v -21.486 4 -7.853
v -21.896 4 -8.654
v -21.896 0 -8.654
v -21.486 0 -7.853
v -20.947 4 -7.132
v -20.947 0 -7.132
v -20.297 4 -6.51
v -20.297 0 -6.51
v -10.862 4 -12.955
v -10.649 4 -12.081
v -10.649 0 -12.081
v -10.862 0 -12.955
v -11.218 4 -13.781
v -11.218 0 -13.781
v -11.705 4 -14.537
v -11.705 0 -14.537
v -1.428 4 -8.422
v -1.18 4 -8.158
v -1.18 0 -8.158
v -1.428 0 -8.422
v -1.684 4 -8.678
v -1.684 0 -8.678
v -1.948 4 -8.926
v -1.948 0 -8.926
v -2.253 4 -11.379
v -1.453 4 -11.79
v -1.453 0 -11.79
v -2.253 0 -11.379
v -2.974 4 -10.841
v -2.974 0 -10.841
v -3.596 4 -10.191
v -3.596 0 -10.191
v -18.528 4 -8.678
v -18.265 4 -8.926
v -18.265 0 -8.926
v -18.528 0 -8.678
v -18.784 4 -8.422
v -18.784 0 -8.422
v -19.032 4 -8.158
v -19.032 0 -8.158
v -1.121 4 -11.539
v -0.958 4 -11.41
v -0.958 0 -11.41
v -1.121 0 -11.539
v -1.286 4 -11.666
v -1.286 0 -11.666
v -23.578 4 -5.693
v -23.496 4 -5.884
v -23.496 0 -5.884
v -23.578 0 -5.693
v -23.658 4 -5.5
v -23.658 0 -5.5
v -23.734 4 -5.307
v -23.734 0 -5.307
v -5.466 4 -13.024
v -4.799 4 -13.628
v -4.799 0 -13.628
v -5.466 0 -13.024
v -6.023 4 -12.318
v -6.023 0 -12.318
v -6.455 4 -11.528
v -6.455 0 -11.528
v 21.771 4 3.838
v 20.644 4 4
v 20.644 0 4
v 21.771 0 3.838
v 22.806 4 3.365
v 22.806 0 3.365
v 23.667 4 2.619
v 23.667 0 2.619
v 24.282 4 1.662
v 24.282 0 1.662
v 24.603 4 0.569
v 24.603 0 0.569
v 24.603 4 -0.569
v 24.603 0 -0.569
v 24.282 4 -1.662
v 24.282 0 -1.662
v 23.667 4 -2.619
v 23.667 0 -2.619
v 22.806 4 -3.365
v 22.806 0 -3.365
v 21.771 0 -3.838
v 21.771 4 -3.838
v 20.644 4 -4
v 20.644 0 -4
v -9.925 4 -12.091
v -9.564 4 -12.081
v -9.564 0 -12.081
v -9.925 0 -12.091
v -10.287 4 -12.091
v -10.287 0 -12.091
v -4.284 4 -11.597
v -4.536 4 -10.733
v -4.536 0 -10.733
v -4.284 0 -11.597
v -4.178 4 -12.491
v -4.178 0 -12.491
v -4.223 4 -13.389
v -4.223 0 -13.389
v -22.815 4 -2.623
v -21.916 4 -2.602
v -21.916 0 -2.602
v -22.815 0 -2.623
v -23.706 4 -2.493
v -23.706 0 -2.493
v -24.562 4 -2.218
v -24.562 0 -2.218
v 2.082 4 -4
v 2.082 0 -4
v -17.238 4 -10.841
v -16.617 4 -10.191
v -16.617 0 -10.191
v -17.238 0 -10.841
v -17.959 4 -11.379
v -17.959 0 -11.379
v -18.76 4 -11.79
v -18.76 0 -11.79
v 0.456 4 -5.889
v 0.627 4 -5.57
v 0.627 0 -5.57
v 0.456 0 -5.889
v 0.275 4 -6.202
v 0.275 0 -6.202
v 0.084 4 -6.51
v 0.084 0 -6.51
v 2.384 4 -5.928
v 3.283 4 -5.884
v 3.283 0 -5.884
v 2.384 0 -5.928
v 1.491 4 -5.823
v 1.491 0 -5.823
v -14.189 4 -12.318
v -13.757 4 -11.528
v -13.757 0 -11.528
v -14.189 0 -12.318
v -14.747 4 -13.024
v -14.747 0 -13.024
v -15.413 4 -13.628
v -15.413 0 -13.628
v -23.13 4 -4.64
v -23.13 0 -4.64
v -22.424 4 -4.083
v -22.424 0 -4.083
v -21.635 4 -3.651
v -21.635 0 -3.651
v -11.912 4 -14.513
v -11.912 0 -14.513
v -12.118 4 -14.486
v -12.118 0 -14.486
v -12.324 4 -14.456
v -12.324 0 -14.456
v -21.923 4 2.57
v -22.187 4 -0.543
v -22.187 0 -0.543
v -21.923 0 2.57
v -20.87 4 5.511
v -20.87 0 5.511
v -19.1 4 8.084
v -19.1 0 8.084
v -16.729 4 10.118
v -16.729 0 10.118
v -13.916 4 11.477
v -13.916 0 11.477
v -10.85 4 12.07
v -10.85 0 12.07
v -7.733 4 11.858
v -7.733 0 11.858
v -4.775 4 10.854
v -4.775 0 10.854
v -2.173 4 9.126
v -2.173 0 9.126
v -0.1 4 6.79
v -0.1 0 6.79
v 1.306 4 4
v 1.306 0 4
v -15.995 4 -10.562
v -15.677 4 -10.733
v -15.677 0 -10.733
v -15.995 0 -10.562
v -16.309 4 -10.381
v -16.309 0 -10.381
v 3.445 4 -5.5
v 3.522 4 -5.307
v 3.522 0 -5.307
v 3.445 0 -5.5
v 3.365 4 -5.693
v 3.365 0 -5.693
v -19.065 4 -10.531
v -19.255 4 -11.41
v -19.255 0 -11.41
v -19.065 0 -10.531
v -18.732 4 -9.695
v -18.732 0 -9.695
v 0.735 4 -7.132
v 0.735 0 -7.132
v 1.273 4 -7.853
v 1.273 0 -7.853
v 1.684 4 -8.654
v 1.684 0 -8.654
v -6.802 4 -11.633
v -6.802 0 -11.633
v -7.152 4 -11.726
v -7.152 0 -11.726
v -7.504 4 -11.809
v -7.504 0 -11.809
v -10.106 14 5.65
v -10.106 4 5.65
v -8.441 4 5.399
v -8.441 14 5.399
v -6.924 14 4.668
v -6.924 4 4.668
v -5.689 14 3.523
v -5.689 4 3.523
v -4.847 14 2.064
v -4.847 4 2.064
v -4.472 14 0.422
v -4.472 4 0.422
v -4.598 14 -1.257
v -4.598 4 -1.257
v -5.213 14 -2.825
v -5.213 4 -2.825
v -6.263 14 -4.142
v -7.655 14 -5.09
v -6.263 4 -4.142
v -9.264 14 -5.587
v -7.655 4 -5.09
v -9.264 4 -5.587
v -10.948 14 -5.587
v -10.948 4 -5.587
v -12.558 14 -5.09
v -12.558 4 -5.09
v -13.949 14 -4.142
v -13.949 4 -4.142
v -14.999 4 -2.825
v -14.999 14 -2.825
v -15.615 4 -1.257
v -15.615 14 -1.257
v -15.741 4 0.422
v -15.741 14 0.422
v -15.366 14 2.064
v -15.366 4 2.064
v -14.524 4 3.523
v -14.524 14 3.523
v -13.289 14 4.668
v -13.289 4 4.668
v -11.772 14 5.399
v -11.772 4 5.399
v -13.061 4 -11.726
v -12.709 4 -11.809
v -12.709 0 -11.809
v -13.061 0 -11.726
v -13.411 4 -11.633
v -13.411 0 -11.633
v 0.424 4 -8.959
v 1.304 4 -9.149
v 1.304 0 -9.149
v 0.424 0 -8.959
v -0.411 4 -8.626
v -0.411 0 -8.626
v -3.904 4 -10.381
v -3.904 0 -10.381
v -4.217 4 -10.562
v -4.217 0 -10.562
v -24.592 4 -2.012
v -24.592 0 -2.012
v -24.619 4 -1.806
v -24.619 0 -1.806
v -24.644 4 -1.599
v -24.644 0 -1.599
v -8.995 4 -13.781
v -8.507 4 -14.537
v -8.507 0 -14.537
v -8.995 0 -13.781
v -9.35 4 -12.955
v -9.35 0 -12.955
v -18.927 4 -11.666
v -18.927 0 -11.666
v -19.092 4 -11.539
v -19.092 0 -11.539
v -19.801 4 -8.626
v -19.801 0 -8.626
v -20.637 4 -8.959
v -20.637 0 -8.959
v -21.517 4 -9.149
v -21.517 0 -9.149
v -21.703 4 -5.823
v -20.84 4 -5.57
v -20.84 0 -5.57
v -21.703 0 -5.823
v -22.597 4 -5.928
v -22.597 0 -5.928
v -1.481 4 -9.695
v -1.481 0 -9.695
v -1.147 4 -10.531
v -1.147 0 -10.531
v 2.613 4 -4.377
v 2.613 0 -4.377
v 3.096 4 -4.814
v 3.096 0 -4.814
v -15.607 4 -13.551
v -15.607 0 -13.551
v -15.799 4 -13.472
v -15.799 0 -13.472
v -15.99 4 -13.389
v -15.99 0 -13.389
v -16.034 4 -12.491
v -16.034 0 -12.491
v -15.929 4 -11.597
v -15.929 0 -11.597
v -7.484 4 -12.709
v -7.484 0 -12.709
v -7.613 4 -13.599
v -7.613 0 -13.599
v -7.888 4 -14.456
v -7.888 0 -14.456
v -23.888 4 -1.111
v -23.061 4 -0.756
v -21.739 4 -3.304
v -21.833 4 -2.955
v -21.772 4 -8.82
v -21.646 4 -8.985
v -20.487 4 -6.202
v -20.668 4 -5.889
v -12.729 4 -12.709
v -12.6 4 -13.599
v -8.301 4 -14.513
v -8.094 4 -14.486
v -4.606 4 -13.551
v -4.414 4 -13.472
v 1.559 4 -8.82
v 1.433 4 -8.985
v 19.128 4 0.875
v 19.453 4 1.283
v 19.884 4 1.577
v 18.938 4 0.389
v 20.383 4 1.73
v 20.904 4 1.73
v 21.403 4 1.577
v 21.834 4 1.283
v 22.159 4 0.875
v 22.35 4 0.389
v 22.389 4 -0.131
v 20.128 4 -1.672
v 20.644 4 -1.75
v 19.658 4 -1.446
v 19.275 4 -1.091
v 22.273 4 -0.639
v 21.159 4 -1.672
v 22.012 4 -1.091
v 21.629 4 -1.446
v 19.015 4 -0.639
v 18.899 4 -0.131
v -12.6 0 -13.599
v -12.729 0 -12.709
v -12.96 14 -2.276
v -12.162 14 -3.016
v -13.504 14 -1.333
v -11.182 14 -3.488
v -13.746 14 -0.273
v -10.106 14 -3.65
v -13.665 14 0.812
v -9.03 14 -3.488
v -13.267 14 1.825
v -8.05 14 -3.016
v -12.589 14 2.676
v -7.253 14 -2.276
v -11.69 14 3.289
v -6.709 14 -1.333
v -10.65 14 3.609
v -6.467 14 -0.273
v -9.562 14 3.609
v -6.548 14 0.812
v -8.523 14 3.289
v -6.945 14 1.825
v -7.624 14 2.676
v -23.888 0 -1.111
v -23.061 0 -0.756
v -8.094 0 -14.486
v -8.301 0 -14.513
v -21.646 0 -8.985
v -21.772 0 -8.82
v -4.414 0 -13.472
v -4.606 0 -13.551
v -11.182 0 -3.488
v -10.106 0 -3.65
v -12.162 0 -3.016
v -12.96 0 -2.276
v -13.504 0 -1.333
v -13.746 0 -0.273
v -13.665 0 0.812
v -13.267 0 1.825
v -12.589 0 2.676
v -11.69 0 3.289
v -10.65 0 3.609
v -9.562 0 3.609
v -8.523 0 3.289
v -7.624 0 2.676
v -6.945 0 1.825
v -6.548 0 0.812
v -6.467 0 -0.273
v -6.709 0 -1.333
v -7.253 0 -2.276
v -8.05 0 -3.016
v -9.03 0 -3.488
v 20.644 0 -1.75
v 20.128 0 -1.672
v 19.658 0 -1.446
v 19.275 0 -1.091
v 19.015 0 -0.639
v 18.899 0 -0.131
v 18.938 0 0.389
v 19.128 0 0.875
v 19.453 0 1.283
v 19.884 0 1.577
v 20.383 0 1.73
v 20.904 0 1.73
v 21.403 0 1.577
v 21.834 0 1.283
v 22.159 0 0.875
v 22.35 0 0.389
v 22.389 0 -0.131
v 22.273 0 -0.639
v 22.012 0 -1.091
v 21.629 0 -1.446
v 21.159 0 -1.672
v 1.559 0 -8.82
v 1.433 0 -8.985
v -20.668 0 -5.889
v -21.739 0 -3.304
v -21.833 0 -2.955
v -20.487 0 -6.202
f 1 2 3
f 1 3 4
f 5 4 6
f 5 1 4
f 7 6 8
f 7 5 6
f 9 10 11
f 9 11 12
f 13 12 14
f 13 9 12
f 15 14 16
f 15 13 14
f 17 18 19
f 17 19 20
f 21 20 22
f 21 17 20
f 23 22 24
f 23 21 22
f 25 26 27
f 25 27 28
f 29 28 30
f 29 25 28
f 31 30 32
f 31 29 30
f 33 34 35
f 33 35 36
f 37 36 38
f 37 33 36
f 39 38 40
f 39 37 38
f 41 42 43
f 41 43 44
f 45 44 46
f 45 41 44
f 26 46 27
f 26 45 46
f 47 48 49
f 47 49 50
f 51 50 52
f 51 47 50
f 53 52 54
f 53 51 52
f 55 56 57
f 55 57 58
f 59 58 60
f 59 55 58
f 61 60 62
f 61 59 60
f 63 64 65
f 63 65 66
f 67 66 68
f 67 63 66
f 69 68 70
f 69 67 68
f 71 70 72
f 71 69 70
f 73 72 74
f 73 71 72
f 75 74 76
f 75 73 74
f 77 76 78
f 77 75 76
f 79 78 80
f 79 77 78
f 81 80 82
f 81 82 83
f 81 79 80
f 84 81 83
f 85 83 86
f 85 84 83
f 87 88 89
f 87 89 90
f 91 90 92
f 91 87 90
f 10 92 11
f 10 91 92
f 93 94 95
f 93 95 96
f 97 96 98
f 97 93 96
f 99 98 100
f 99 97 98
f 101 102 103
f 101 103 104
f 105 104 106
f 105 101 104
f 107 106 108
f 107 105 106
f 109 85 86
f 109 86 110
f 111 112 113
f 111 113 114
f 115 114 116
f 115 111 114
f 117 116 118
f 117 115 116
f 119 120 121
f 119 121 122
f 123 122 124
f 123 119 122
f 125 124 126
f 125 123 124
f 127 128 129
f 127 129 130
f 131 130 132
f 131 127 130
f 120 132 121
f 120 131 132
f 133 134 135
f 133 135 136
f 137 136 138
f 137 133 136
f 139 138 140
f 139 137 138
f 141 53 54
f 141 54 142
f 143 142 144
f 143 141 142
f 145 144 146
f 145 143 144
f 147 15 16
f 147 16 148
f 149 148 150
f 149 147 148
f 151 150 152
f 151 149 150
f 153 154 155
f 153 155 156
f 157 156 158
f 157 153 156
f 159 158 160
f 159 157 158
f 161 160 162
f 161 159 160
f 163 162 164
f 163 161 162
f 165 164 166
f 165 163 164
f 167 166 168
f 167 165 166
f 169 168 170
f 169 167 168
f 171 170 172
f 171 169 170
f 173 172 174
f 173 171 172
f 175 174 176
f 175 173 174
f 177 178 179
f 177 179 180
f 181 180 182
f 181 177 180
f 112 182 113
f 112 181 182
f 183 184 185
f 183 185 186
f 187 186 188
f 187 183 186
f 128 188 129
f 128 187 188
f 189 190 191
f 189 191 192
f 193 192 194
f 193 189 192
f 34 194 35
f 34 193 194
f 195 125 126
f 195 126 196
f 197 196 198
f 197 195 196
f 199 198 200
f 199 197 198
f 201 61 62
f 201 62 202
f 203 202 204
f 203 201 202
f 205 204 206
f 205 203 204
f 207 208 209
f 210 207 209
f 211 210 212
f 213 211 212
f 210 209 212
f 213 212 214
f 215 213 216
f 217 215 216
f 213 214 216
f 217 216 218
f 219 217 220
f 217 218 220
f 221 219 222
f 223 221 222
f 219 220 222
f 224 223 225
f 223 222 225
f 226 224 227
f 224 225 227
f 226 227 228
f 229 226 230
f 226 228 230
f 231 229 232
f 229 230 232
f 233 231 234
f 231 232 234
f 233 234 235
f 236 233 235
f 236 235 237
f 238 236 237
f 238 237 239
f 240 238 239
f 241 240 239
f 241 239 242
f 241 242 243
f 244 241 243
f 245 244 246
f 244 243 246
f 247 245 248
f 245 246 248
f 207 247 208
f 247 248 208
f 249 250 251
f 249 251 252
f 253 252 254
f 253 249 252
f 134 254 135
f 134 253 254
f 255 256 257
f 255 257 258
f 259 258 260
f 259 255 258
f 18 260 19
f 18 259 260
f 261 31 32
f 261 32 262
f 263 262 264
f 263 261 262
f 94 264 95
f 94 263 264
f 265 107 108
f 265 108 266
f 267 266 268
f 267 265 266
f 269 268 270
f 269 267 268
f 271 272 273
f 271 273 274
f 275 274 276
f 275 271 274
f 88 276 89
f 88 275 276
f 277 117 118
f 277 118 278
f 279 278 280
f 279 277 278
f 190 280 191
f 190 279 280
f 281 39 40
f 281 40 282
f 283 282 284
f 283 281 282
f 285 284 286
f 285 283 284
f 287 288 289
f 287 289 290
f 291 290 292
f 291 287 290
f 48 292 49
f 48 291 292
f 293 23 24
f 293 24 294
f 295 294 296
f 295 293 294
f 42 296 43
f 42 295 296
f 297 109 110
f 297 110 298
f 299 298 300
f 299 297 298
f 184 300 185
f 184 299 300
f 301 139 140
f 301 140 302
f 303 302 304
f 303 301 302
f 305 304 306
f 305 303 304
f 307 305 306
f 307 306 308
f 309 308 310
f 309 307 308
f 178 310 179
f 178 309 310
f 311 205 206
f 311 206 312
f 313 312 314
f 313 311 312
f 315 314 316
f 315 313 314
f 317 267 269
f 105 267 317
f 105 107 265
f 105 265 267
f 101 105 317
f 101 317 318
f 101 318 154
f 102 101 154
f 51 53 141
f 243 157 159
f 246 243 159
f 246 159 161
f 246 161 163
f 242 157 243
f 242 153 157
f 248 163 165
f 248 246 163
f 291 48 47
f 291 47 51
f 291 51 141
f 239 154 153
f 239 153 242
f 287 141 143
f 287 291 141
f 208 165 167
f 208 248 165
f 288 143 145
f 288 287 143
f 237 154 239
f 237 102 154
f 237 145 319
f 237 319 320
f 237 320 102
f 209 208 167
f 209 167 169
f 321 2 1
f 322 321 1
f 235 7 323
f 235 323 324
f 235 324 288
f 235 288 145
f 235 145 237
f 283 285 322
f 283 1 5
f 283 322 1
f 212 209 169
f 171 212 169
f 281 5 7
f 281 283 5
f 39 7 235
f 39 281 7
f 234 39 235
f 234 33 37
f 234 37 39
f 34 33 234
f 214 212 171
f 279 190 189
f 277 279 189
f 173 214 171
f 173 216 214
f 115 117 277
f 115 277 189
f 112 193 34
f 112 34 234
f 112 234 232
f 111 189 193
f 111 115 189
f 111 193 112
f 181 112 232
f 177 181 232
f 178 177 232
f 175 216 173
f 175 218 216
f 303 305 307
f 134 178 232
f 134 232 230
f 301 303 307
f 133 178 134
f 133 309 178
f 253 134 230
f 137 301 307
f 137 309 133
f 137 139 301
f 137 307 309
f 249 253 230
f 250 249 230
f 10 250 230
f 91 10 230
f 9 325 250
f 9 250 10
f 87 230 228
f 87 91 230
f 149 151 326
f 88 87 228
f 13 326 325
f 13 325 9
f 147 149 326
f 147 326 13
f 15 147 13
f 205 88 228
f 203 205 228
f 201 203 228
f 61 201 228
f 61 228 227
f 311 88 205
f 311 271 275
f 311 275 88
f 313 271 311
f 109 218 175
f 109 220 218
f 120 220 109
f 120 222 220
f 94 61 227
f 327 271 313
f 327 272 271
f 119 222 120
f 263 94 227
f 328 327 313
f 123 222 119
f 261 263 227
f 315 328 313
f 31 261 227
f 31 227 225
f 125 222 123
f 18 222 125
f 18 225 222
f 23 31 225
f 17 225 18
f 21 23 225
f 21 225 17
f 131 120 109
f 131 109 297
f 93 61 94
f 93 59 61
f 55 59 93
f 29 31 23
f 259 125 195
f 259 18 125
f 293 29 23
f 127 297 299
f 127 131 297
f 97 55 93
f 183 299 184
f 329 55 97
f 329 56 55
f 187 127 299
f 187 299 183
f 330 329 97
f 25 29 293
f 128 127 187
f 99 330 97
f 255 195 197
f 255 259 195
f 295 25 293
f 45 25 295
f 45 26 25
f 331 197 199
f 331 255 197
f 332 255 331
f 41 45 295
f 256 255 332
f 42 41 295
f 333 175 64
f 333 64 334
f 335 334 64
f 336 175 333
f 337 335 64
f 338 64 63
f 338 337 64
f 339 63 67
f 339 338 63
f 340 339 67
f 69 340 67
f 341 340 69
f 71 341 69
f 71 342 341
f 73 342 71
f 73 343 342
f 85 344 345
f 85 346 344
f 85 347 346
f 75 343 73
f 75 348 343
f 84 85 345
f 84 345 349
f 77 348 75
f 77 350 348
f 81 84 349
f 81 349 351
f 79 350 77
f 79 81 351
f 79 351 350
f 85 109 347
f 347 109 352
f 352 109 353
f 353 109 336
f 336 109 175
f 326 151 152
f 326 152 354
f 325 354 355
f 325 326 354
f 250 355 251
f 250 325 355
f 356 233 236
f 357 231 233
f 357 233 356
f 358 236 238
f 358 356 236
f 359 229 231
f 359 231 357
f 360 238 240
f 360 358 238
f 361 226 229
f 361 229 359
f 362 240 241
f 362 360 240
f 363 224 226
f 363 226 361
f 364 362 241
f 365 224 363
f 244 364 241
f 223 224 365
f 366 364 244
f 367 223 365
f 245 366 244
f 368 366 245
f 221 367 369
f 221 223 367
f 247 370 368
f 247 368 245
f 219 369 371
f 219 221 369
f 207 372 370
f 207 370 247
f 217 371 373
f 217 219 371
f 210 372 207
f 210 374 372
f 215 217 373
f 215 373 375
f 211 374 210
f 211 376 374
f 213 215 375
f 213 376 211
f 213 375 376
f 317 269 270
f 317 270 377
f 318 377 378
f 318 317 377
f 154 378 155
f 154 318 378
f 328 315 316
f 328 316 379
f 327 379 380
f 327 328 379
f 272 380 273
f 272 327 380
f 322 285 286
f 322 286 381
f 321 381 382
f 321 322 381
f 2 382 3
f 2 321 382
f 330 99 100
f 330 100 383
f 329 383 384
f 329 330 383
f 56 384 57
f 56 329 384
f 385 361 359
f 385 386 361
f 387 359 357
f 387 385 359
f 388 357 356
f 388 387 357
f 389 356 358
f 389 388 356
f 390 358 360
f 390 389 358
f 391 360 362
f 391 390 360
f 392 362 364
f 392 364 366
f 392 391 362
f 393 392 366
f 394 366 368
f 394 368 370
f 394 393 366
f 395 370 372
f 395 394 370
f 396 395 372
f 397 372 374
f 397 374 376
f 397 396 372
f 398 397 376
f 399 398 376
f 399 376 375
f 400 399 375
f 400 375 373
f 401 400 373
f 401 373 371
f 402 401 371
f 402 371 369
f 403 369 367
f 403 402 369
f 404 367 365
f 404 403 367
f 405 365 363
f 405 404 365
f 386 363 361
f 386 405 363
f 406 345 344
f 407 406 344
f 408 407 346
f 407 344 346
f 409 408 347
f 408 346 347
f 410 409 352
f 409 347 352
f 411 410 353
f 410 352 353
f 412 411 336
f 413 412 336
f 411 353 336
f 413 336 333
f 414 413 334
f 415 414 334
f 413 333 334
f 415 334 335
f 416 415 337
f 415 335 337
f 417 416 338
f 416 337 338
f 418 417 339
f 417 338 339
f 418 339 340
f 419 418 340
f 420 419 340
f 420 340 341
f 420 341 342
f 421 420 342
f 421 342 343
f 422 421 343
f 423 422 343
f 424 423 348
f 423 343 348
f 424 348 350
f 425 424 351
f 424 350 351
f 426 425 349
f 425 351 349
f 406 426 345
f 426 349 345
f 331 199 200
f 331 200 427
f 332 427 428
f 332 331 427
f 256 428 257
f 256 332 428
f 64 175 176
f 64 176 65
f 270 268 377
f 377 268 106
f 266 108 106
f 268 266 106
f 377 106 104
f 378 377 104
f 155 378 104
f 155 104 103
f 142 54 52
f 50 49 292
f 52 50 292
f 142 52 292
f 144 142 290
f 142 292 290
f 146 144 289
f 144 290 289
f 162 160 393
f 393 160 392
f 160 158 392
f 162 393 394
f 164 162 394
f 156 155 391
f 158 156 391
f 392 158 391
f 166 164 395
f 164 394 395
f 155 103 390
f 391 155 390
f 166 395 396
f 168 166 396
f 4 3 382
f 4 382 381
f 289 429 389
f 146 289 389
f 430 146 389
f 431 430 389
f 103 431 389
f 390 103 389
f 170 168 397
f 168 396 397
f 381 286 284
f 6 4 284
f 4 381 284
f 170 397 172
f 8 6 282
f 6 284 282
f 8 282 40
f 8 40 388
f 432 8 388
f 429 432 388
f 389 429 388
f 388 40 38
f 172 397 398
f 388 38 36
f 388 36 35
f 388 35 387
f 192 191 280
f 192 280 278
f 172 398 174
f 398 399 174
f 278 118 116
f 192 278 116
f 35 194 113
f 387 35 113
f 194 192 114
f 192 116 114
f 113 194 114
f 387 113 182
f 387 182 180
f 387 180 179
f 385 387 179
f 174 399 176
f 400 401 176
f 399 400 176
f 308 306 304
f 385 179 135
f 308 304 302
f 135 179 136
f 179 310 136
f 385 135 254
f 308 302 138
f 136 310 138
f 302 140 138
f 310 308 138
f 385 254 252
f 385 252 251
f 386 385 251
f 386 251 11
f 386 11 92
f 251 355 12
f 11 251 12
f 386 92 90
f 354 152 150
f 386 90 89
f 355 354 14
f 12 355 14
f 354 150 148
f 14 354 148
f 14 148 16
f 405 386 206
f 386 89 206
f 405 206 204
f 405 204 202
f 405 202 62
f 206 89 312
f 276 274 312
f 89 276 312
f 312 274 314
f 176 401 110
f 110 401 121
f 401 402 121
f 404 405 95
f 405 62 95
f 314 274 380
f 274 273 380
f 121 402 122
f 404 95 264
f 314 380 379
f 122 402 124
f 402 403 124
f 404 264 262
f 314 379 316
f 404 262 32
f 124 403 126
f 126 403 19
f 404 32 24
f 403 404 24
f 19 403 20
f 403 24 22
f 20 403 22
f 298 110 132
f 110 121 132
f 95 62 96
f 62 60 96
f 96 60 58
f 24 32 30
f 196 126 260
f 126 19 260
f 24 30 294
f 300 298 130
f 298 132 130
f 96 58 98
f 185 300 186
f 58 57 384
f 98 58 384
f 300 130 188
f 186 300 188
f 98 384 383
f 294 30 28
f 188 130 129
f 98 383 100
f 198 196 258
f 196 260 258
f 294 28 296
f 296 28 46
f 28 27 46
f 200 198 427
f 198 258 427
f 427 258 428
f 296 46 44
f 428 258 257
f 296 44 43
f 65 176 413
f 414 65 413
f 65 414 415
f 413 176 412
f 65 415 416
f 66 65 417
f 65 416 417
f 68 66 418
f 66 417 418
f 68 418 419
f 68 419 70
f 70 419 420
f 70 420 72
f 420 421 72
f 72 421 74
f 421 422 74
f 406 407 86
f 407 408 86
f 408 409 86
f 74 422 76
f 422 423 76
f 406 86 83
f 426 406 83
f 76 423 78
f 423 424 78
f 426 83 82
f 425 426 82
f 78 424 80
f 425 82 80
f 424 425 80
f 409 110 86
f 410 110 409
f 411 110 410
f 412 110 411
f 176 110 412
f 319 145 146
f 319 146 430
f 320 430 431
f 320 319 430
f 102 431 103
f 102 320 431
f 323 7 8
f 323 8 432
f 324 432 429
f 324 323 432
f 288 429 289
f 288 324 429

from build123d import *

# Parameters (mm, degrees)
SKETCH1_R           = 1.75
BOSS_EXTRUDE1_DEPTH = 4
SKETCH_1_R          = 3.65
CUT_EXTRUDE_1_DEPTH = 29.890195164
SKETCH_2_R          = 5.65
SKETCH_2_R_2        = 3.65
EXTRUDE_1_DEPTH     = 10


with BuildPart() as part:
    # Sketch1 → Boss-Extrude1 (new body)
    with BuildSketch(Plane(origin=(0, 4, 0), x_dir=(1, 0, 0), z_dir=(0, 1, 0))):
        with BuildLine():
            Line((1.305695063, -4), (20.643657446, -4))
            ThreePointArc((20.643657446, -4), (24.643657446, 0), (20.643657446, 4))
            Line((20.643657446, 4), (2.081641936, 4))
            ThreePointArc((2.081641936, 4), (2.861028333, 4.588201733), (3.521749436, 5.30713988))
            ThreePointArc((3.521749436, 5.30713988), (3.405395609, 5.596745198), (3.282888305, 5.883801663))
            ThreePointArc((3.282888305, 5.883801663), (1.93527598, 5.894040025), (0.627094961, 5.57027124))
            ThreePointArc((0.627094961, 5.57027124), (0.366286148, 6.046375), (0.084372603, 6.510293938))
            ThreePointArc((0.084372603, 6.510293938), (1.018855105, 7.48132754), (1.683794586, 8.65351323))
            ThreePointArc((1.683794586, 8.65351323), (1.496450048, 8.903135899), (1.303821399, 9.148703928))
            ThreePointArc((1.303821399, 9.148703928), (-0.000522033, 8.809805691), (-1.180330337, 8.158486898))
            ThreePointArc((-1.180330337, 8.158486898), (-1.555477026, 8.550865528), (-1.947855656, 8.926012217))
            ThreePointArc((-1.947855656, 8.926012217), (-1.296536862, 10.105820521), (-0.957638625, 11.410163953))
            ThreePointArc((-0.957638625, 11.410163953), (-1.203206655, 11.602792602), (-1.452829324, 11.79013714))
            ThreePointArc((-1.452829324, 11.79013714), (-2.625015014, 11.125197659), (-3.596048616, 10.190715157))
            ThreePointArc((-3.596048616, 10.190715157), (-4.059967554, 10.472628702), (-4.536071314, 10.733437515))
            ThreePointArc((-4.536071314, 10.733437515), (-4.212302529, 12.041618533), (-4.222540891, 13.389230859))
            ThreePointArc((-4.222540891, 13.389230859), (-4.509597355, 13.511738163), (-4.799202674, 13.62809199))
            ThreePointArc((-4.799202674, 13.62809199), (-5.759348103, 12.682425791), (-6.455432668, 11.528463019))
            ThreePointArc((-6.455432668, 11.528463019), (-6.976508546, 11.680699536), (-7.503891752, 11.809396783))
            ThreePointArc((-7.503891752, 11.809396783), (-7.529737283, 13.156800143), (-7.888414517, 14.455843809))
            ThreePointArc((-7.888414517, 14.455843809), (-8.197396993, 14.499881098), (-8.507248835, 14.537314892))
            ThreePointArc((-8.507248835, 14.537314892), (-9.18992168, 13.375367565), (-9.563620196, 12.080565177))
            ThreePointArc((-9.563620196, 12.080565177), (-10.106342554, 12.09275), (-10.649064912, 12.080565177))
            ThreePointArc((-10.649064912, 12.080565177), (-11.022763428, 13.375367565), (-11.705436272, 14.537314892))
            ThreePointArc((-11.705436272, 14.537314892), (-12.015288115, 14.499881098), (-12.324270591, 14.455843809))
            ThreePointArc((-12.324270591, 14.455843809), (-12.682947825, 13.156800143), (-12.708793355, 11.809396783))
            ThreePointArc((-12.708793355, 11.809396783), (-13.236176561, 11.680699536), (-13.757252439, 11.528463019))
            ThreePointArc((-13.757252439, 11.528463019), (-14.453337005, 12.682425791), (-15.413482434, 13.62809199))
            ThreePointArc((-15.413482434, 13.62809199), (-15.703087752, 13.511738163), (-15.990144217, 13.389230859))
            ThreePointArc((-15.990144217, 13.389230859), (-16.000382579, 12.041618533), (-15.676613793, 10.733437515))
            ThreePointArc((-15.676613793, 10.733437515), (-16.152717554, 10.472628702), (-16.616636492, 10.190715157))
            ThreePointArc((-16.616636492, 10.190715157), (-17.587670094, 11.125197659), (-18.759855783, 11.79013714))
            ThreePointArc((-18.759855783, 11.79013714), (-19.009478453, 11.602792602), (-19.255046482, 11.410163953))
            ThreePointArc((-19.255046482, 11.410163953), (-18.916148245, 10.105820521), (-18.264829452, 8.926012217))
            ThreePointArc((-18.264829452, 8.926012217), (-18.657208082, 8.550865528), (-19.032354771, 8.158486898))
            ThreePointArc((-19.032354771, 8.158486898), (-20.212163074, 8.809805691), (-21.516506507, 9.148703928))
            ThreePointArc((-21.516506507, 9.148703928), (-21.709135156, 8.903135899), (-21.896479694, 8.65351323))
            ThreePointArc((-21.896479694, 8.65351323), (-21.231540213, 7.48132754), (-20.297057711, 6.510293938))
            ThreePointArc((-20.297057711, 6.510293938), (-20.578971255, 6.046375), (-20.839780068, 5.57027124))
            ThreePointArc((-20.839780068, 5.57027124), (-22.147961087, 5.894040025), (-23.495573413, 5.883801663))
            ThreePointArc((-23.495573413, 5.883801663), (-23.618080717, 5.596745198), (-23.734434544, 5.30713988))
            ThreePointArc((-23.734434544, 5.30713988), (-22.788768345, 4.346994451), (-21.634805572, 3.650909885))
            ThreePointArc((-21.634805572, 3.650909885), (-21.78704209, 3.129834008), (-21.915739337, 2.602450802))
            ThreePointArc((-21.915739337, 2.602450802), (-23.263142697, 2.576605271), (-24.562186363, 2.217928037))
            ThreePointArc((-24.562186363, 2.217928037), (-24.606223651, 1.908945561), (-24.643657446, 1.599093719))
            ThreePointArc((-24.643657446, 1.599093719), (-23.481710119, 0.916420874), (-22.186907731, 0.542722358))
            ThreePointArc((-22.186907731, 0.542722358), (-12.402167869, -11.872817218), (1.305695063, -4))
        make_face()
        with Locations(Location((20.643657446, 0, 0), (0, 0, 90))):
            Circle(SKETCH1_R, mode=Mode.SUBTRACT)
    extrude(amount=-BOSS_EXTRUDE1_DEPTH)

    # 草图1 → 切除-拉伸1 (cut, through all)
    with BuildSketch(Plane.XZ):
        with Locations(Location((-10.106342554, 0, 0), (0, 0, 270))):
            Circle(SKETCH_1_R)
    extrude(amount=-CUT_EXTRUDE_1_DEPTH, mode=Mode.SUBTRACT)

    # 草图2 → 凸台-拉伸1 (add)
    with BuildSketch(Plane(origin=(0, 4, 0), x_dir=(1, 0, 0), z_dir=(0, 1, 0))):
        with Locations(Location((-10.106342554, 0, 0), (0, 0, 270))):
            Circle(SKETCH_2_R)
        with Locations(Location((-10.106342554, 0, 0), (0, 0, 90))):
            Circle(SKETCH_2_R_2, mode=Mode.SUBTRACT)
    extrude(amount=EXTRUDE_1_DEPTH)


solid = part.part
